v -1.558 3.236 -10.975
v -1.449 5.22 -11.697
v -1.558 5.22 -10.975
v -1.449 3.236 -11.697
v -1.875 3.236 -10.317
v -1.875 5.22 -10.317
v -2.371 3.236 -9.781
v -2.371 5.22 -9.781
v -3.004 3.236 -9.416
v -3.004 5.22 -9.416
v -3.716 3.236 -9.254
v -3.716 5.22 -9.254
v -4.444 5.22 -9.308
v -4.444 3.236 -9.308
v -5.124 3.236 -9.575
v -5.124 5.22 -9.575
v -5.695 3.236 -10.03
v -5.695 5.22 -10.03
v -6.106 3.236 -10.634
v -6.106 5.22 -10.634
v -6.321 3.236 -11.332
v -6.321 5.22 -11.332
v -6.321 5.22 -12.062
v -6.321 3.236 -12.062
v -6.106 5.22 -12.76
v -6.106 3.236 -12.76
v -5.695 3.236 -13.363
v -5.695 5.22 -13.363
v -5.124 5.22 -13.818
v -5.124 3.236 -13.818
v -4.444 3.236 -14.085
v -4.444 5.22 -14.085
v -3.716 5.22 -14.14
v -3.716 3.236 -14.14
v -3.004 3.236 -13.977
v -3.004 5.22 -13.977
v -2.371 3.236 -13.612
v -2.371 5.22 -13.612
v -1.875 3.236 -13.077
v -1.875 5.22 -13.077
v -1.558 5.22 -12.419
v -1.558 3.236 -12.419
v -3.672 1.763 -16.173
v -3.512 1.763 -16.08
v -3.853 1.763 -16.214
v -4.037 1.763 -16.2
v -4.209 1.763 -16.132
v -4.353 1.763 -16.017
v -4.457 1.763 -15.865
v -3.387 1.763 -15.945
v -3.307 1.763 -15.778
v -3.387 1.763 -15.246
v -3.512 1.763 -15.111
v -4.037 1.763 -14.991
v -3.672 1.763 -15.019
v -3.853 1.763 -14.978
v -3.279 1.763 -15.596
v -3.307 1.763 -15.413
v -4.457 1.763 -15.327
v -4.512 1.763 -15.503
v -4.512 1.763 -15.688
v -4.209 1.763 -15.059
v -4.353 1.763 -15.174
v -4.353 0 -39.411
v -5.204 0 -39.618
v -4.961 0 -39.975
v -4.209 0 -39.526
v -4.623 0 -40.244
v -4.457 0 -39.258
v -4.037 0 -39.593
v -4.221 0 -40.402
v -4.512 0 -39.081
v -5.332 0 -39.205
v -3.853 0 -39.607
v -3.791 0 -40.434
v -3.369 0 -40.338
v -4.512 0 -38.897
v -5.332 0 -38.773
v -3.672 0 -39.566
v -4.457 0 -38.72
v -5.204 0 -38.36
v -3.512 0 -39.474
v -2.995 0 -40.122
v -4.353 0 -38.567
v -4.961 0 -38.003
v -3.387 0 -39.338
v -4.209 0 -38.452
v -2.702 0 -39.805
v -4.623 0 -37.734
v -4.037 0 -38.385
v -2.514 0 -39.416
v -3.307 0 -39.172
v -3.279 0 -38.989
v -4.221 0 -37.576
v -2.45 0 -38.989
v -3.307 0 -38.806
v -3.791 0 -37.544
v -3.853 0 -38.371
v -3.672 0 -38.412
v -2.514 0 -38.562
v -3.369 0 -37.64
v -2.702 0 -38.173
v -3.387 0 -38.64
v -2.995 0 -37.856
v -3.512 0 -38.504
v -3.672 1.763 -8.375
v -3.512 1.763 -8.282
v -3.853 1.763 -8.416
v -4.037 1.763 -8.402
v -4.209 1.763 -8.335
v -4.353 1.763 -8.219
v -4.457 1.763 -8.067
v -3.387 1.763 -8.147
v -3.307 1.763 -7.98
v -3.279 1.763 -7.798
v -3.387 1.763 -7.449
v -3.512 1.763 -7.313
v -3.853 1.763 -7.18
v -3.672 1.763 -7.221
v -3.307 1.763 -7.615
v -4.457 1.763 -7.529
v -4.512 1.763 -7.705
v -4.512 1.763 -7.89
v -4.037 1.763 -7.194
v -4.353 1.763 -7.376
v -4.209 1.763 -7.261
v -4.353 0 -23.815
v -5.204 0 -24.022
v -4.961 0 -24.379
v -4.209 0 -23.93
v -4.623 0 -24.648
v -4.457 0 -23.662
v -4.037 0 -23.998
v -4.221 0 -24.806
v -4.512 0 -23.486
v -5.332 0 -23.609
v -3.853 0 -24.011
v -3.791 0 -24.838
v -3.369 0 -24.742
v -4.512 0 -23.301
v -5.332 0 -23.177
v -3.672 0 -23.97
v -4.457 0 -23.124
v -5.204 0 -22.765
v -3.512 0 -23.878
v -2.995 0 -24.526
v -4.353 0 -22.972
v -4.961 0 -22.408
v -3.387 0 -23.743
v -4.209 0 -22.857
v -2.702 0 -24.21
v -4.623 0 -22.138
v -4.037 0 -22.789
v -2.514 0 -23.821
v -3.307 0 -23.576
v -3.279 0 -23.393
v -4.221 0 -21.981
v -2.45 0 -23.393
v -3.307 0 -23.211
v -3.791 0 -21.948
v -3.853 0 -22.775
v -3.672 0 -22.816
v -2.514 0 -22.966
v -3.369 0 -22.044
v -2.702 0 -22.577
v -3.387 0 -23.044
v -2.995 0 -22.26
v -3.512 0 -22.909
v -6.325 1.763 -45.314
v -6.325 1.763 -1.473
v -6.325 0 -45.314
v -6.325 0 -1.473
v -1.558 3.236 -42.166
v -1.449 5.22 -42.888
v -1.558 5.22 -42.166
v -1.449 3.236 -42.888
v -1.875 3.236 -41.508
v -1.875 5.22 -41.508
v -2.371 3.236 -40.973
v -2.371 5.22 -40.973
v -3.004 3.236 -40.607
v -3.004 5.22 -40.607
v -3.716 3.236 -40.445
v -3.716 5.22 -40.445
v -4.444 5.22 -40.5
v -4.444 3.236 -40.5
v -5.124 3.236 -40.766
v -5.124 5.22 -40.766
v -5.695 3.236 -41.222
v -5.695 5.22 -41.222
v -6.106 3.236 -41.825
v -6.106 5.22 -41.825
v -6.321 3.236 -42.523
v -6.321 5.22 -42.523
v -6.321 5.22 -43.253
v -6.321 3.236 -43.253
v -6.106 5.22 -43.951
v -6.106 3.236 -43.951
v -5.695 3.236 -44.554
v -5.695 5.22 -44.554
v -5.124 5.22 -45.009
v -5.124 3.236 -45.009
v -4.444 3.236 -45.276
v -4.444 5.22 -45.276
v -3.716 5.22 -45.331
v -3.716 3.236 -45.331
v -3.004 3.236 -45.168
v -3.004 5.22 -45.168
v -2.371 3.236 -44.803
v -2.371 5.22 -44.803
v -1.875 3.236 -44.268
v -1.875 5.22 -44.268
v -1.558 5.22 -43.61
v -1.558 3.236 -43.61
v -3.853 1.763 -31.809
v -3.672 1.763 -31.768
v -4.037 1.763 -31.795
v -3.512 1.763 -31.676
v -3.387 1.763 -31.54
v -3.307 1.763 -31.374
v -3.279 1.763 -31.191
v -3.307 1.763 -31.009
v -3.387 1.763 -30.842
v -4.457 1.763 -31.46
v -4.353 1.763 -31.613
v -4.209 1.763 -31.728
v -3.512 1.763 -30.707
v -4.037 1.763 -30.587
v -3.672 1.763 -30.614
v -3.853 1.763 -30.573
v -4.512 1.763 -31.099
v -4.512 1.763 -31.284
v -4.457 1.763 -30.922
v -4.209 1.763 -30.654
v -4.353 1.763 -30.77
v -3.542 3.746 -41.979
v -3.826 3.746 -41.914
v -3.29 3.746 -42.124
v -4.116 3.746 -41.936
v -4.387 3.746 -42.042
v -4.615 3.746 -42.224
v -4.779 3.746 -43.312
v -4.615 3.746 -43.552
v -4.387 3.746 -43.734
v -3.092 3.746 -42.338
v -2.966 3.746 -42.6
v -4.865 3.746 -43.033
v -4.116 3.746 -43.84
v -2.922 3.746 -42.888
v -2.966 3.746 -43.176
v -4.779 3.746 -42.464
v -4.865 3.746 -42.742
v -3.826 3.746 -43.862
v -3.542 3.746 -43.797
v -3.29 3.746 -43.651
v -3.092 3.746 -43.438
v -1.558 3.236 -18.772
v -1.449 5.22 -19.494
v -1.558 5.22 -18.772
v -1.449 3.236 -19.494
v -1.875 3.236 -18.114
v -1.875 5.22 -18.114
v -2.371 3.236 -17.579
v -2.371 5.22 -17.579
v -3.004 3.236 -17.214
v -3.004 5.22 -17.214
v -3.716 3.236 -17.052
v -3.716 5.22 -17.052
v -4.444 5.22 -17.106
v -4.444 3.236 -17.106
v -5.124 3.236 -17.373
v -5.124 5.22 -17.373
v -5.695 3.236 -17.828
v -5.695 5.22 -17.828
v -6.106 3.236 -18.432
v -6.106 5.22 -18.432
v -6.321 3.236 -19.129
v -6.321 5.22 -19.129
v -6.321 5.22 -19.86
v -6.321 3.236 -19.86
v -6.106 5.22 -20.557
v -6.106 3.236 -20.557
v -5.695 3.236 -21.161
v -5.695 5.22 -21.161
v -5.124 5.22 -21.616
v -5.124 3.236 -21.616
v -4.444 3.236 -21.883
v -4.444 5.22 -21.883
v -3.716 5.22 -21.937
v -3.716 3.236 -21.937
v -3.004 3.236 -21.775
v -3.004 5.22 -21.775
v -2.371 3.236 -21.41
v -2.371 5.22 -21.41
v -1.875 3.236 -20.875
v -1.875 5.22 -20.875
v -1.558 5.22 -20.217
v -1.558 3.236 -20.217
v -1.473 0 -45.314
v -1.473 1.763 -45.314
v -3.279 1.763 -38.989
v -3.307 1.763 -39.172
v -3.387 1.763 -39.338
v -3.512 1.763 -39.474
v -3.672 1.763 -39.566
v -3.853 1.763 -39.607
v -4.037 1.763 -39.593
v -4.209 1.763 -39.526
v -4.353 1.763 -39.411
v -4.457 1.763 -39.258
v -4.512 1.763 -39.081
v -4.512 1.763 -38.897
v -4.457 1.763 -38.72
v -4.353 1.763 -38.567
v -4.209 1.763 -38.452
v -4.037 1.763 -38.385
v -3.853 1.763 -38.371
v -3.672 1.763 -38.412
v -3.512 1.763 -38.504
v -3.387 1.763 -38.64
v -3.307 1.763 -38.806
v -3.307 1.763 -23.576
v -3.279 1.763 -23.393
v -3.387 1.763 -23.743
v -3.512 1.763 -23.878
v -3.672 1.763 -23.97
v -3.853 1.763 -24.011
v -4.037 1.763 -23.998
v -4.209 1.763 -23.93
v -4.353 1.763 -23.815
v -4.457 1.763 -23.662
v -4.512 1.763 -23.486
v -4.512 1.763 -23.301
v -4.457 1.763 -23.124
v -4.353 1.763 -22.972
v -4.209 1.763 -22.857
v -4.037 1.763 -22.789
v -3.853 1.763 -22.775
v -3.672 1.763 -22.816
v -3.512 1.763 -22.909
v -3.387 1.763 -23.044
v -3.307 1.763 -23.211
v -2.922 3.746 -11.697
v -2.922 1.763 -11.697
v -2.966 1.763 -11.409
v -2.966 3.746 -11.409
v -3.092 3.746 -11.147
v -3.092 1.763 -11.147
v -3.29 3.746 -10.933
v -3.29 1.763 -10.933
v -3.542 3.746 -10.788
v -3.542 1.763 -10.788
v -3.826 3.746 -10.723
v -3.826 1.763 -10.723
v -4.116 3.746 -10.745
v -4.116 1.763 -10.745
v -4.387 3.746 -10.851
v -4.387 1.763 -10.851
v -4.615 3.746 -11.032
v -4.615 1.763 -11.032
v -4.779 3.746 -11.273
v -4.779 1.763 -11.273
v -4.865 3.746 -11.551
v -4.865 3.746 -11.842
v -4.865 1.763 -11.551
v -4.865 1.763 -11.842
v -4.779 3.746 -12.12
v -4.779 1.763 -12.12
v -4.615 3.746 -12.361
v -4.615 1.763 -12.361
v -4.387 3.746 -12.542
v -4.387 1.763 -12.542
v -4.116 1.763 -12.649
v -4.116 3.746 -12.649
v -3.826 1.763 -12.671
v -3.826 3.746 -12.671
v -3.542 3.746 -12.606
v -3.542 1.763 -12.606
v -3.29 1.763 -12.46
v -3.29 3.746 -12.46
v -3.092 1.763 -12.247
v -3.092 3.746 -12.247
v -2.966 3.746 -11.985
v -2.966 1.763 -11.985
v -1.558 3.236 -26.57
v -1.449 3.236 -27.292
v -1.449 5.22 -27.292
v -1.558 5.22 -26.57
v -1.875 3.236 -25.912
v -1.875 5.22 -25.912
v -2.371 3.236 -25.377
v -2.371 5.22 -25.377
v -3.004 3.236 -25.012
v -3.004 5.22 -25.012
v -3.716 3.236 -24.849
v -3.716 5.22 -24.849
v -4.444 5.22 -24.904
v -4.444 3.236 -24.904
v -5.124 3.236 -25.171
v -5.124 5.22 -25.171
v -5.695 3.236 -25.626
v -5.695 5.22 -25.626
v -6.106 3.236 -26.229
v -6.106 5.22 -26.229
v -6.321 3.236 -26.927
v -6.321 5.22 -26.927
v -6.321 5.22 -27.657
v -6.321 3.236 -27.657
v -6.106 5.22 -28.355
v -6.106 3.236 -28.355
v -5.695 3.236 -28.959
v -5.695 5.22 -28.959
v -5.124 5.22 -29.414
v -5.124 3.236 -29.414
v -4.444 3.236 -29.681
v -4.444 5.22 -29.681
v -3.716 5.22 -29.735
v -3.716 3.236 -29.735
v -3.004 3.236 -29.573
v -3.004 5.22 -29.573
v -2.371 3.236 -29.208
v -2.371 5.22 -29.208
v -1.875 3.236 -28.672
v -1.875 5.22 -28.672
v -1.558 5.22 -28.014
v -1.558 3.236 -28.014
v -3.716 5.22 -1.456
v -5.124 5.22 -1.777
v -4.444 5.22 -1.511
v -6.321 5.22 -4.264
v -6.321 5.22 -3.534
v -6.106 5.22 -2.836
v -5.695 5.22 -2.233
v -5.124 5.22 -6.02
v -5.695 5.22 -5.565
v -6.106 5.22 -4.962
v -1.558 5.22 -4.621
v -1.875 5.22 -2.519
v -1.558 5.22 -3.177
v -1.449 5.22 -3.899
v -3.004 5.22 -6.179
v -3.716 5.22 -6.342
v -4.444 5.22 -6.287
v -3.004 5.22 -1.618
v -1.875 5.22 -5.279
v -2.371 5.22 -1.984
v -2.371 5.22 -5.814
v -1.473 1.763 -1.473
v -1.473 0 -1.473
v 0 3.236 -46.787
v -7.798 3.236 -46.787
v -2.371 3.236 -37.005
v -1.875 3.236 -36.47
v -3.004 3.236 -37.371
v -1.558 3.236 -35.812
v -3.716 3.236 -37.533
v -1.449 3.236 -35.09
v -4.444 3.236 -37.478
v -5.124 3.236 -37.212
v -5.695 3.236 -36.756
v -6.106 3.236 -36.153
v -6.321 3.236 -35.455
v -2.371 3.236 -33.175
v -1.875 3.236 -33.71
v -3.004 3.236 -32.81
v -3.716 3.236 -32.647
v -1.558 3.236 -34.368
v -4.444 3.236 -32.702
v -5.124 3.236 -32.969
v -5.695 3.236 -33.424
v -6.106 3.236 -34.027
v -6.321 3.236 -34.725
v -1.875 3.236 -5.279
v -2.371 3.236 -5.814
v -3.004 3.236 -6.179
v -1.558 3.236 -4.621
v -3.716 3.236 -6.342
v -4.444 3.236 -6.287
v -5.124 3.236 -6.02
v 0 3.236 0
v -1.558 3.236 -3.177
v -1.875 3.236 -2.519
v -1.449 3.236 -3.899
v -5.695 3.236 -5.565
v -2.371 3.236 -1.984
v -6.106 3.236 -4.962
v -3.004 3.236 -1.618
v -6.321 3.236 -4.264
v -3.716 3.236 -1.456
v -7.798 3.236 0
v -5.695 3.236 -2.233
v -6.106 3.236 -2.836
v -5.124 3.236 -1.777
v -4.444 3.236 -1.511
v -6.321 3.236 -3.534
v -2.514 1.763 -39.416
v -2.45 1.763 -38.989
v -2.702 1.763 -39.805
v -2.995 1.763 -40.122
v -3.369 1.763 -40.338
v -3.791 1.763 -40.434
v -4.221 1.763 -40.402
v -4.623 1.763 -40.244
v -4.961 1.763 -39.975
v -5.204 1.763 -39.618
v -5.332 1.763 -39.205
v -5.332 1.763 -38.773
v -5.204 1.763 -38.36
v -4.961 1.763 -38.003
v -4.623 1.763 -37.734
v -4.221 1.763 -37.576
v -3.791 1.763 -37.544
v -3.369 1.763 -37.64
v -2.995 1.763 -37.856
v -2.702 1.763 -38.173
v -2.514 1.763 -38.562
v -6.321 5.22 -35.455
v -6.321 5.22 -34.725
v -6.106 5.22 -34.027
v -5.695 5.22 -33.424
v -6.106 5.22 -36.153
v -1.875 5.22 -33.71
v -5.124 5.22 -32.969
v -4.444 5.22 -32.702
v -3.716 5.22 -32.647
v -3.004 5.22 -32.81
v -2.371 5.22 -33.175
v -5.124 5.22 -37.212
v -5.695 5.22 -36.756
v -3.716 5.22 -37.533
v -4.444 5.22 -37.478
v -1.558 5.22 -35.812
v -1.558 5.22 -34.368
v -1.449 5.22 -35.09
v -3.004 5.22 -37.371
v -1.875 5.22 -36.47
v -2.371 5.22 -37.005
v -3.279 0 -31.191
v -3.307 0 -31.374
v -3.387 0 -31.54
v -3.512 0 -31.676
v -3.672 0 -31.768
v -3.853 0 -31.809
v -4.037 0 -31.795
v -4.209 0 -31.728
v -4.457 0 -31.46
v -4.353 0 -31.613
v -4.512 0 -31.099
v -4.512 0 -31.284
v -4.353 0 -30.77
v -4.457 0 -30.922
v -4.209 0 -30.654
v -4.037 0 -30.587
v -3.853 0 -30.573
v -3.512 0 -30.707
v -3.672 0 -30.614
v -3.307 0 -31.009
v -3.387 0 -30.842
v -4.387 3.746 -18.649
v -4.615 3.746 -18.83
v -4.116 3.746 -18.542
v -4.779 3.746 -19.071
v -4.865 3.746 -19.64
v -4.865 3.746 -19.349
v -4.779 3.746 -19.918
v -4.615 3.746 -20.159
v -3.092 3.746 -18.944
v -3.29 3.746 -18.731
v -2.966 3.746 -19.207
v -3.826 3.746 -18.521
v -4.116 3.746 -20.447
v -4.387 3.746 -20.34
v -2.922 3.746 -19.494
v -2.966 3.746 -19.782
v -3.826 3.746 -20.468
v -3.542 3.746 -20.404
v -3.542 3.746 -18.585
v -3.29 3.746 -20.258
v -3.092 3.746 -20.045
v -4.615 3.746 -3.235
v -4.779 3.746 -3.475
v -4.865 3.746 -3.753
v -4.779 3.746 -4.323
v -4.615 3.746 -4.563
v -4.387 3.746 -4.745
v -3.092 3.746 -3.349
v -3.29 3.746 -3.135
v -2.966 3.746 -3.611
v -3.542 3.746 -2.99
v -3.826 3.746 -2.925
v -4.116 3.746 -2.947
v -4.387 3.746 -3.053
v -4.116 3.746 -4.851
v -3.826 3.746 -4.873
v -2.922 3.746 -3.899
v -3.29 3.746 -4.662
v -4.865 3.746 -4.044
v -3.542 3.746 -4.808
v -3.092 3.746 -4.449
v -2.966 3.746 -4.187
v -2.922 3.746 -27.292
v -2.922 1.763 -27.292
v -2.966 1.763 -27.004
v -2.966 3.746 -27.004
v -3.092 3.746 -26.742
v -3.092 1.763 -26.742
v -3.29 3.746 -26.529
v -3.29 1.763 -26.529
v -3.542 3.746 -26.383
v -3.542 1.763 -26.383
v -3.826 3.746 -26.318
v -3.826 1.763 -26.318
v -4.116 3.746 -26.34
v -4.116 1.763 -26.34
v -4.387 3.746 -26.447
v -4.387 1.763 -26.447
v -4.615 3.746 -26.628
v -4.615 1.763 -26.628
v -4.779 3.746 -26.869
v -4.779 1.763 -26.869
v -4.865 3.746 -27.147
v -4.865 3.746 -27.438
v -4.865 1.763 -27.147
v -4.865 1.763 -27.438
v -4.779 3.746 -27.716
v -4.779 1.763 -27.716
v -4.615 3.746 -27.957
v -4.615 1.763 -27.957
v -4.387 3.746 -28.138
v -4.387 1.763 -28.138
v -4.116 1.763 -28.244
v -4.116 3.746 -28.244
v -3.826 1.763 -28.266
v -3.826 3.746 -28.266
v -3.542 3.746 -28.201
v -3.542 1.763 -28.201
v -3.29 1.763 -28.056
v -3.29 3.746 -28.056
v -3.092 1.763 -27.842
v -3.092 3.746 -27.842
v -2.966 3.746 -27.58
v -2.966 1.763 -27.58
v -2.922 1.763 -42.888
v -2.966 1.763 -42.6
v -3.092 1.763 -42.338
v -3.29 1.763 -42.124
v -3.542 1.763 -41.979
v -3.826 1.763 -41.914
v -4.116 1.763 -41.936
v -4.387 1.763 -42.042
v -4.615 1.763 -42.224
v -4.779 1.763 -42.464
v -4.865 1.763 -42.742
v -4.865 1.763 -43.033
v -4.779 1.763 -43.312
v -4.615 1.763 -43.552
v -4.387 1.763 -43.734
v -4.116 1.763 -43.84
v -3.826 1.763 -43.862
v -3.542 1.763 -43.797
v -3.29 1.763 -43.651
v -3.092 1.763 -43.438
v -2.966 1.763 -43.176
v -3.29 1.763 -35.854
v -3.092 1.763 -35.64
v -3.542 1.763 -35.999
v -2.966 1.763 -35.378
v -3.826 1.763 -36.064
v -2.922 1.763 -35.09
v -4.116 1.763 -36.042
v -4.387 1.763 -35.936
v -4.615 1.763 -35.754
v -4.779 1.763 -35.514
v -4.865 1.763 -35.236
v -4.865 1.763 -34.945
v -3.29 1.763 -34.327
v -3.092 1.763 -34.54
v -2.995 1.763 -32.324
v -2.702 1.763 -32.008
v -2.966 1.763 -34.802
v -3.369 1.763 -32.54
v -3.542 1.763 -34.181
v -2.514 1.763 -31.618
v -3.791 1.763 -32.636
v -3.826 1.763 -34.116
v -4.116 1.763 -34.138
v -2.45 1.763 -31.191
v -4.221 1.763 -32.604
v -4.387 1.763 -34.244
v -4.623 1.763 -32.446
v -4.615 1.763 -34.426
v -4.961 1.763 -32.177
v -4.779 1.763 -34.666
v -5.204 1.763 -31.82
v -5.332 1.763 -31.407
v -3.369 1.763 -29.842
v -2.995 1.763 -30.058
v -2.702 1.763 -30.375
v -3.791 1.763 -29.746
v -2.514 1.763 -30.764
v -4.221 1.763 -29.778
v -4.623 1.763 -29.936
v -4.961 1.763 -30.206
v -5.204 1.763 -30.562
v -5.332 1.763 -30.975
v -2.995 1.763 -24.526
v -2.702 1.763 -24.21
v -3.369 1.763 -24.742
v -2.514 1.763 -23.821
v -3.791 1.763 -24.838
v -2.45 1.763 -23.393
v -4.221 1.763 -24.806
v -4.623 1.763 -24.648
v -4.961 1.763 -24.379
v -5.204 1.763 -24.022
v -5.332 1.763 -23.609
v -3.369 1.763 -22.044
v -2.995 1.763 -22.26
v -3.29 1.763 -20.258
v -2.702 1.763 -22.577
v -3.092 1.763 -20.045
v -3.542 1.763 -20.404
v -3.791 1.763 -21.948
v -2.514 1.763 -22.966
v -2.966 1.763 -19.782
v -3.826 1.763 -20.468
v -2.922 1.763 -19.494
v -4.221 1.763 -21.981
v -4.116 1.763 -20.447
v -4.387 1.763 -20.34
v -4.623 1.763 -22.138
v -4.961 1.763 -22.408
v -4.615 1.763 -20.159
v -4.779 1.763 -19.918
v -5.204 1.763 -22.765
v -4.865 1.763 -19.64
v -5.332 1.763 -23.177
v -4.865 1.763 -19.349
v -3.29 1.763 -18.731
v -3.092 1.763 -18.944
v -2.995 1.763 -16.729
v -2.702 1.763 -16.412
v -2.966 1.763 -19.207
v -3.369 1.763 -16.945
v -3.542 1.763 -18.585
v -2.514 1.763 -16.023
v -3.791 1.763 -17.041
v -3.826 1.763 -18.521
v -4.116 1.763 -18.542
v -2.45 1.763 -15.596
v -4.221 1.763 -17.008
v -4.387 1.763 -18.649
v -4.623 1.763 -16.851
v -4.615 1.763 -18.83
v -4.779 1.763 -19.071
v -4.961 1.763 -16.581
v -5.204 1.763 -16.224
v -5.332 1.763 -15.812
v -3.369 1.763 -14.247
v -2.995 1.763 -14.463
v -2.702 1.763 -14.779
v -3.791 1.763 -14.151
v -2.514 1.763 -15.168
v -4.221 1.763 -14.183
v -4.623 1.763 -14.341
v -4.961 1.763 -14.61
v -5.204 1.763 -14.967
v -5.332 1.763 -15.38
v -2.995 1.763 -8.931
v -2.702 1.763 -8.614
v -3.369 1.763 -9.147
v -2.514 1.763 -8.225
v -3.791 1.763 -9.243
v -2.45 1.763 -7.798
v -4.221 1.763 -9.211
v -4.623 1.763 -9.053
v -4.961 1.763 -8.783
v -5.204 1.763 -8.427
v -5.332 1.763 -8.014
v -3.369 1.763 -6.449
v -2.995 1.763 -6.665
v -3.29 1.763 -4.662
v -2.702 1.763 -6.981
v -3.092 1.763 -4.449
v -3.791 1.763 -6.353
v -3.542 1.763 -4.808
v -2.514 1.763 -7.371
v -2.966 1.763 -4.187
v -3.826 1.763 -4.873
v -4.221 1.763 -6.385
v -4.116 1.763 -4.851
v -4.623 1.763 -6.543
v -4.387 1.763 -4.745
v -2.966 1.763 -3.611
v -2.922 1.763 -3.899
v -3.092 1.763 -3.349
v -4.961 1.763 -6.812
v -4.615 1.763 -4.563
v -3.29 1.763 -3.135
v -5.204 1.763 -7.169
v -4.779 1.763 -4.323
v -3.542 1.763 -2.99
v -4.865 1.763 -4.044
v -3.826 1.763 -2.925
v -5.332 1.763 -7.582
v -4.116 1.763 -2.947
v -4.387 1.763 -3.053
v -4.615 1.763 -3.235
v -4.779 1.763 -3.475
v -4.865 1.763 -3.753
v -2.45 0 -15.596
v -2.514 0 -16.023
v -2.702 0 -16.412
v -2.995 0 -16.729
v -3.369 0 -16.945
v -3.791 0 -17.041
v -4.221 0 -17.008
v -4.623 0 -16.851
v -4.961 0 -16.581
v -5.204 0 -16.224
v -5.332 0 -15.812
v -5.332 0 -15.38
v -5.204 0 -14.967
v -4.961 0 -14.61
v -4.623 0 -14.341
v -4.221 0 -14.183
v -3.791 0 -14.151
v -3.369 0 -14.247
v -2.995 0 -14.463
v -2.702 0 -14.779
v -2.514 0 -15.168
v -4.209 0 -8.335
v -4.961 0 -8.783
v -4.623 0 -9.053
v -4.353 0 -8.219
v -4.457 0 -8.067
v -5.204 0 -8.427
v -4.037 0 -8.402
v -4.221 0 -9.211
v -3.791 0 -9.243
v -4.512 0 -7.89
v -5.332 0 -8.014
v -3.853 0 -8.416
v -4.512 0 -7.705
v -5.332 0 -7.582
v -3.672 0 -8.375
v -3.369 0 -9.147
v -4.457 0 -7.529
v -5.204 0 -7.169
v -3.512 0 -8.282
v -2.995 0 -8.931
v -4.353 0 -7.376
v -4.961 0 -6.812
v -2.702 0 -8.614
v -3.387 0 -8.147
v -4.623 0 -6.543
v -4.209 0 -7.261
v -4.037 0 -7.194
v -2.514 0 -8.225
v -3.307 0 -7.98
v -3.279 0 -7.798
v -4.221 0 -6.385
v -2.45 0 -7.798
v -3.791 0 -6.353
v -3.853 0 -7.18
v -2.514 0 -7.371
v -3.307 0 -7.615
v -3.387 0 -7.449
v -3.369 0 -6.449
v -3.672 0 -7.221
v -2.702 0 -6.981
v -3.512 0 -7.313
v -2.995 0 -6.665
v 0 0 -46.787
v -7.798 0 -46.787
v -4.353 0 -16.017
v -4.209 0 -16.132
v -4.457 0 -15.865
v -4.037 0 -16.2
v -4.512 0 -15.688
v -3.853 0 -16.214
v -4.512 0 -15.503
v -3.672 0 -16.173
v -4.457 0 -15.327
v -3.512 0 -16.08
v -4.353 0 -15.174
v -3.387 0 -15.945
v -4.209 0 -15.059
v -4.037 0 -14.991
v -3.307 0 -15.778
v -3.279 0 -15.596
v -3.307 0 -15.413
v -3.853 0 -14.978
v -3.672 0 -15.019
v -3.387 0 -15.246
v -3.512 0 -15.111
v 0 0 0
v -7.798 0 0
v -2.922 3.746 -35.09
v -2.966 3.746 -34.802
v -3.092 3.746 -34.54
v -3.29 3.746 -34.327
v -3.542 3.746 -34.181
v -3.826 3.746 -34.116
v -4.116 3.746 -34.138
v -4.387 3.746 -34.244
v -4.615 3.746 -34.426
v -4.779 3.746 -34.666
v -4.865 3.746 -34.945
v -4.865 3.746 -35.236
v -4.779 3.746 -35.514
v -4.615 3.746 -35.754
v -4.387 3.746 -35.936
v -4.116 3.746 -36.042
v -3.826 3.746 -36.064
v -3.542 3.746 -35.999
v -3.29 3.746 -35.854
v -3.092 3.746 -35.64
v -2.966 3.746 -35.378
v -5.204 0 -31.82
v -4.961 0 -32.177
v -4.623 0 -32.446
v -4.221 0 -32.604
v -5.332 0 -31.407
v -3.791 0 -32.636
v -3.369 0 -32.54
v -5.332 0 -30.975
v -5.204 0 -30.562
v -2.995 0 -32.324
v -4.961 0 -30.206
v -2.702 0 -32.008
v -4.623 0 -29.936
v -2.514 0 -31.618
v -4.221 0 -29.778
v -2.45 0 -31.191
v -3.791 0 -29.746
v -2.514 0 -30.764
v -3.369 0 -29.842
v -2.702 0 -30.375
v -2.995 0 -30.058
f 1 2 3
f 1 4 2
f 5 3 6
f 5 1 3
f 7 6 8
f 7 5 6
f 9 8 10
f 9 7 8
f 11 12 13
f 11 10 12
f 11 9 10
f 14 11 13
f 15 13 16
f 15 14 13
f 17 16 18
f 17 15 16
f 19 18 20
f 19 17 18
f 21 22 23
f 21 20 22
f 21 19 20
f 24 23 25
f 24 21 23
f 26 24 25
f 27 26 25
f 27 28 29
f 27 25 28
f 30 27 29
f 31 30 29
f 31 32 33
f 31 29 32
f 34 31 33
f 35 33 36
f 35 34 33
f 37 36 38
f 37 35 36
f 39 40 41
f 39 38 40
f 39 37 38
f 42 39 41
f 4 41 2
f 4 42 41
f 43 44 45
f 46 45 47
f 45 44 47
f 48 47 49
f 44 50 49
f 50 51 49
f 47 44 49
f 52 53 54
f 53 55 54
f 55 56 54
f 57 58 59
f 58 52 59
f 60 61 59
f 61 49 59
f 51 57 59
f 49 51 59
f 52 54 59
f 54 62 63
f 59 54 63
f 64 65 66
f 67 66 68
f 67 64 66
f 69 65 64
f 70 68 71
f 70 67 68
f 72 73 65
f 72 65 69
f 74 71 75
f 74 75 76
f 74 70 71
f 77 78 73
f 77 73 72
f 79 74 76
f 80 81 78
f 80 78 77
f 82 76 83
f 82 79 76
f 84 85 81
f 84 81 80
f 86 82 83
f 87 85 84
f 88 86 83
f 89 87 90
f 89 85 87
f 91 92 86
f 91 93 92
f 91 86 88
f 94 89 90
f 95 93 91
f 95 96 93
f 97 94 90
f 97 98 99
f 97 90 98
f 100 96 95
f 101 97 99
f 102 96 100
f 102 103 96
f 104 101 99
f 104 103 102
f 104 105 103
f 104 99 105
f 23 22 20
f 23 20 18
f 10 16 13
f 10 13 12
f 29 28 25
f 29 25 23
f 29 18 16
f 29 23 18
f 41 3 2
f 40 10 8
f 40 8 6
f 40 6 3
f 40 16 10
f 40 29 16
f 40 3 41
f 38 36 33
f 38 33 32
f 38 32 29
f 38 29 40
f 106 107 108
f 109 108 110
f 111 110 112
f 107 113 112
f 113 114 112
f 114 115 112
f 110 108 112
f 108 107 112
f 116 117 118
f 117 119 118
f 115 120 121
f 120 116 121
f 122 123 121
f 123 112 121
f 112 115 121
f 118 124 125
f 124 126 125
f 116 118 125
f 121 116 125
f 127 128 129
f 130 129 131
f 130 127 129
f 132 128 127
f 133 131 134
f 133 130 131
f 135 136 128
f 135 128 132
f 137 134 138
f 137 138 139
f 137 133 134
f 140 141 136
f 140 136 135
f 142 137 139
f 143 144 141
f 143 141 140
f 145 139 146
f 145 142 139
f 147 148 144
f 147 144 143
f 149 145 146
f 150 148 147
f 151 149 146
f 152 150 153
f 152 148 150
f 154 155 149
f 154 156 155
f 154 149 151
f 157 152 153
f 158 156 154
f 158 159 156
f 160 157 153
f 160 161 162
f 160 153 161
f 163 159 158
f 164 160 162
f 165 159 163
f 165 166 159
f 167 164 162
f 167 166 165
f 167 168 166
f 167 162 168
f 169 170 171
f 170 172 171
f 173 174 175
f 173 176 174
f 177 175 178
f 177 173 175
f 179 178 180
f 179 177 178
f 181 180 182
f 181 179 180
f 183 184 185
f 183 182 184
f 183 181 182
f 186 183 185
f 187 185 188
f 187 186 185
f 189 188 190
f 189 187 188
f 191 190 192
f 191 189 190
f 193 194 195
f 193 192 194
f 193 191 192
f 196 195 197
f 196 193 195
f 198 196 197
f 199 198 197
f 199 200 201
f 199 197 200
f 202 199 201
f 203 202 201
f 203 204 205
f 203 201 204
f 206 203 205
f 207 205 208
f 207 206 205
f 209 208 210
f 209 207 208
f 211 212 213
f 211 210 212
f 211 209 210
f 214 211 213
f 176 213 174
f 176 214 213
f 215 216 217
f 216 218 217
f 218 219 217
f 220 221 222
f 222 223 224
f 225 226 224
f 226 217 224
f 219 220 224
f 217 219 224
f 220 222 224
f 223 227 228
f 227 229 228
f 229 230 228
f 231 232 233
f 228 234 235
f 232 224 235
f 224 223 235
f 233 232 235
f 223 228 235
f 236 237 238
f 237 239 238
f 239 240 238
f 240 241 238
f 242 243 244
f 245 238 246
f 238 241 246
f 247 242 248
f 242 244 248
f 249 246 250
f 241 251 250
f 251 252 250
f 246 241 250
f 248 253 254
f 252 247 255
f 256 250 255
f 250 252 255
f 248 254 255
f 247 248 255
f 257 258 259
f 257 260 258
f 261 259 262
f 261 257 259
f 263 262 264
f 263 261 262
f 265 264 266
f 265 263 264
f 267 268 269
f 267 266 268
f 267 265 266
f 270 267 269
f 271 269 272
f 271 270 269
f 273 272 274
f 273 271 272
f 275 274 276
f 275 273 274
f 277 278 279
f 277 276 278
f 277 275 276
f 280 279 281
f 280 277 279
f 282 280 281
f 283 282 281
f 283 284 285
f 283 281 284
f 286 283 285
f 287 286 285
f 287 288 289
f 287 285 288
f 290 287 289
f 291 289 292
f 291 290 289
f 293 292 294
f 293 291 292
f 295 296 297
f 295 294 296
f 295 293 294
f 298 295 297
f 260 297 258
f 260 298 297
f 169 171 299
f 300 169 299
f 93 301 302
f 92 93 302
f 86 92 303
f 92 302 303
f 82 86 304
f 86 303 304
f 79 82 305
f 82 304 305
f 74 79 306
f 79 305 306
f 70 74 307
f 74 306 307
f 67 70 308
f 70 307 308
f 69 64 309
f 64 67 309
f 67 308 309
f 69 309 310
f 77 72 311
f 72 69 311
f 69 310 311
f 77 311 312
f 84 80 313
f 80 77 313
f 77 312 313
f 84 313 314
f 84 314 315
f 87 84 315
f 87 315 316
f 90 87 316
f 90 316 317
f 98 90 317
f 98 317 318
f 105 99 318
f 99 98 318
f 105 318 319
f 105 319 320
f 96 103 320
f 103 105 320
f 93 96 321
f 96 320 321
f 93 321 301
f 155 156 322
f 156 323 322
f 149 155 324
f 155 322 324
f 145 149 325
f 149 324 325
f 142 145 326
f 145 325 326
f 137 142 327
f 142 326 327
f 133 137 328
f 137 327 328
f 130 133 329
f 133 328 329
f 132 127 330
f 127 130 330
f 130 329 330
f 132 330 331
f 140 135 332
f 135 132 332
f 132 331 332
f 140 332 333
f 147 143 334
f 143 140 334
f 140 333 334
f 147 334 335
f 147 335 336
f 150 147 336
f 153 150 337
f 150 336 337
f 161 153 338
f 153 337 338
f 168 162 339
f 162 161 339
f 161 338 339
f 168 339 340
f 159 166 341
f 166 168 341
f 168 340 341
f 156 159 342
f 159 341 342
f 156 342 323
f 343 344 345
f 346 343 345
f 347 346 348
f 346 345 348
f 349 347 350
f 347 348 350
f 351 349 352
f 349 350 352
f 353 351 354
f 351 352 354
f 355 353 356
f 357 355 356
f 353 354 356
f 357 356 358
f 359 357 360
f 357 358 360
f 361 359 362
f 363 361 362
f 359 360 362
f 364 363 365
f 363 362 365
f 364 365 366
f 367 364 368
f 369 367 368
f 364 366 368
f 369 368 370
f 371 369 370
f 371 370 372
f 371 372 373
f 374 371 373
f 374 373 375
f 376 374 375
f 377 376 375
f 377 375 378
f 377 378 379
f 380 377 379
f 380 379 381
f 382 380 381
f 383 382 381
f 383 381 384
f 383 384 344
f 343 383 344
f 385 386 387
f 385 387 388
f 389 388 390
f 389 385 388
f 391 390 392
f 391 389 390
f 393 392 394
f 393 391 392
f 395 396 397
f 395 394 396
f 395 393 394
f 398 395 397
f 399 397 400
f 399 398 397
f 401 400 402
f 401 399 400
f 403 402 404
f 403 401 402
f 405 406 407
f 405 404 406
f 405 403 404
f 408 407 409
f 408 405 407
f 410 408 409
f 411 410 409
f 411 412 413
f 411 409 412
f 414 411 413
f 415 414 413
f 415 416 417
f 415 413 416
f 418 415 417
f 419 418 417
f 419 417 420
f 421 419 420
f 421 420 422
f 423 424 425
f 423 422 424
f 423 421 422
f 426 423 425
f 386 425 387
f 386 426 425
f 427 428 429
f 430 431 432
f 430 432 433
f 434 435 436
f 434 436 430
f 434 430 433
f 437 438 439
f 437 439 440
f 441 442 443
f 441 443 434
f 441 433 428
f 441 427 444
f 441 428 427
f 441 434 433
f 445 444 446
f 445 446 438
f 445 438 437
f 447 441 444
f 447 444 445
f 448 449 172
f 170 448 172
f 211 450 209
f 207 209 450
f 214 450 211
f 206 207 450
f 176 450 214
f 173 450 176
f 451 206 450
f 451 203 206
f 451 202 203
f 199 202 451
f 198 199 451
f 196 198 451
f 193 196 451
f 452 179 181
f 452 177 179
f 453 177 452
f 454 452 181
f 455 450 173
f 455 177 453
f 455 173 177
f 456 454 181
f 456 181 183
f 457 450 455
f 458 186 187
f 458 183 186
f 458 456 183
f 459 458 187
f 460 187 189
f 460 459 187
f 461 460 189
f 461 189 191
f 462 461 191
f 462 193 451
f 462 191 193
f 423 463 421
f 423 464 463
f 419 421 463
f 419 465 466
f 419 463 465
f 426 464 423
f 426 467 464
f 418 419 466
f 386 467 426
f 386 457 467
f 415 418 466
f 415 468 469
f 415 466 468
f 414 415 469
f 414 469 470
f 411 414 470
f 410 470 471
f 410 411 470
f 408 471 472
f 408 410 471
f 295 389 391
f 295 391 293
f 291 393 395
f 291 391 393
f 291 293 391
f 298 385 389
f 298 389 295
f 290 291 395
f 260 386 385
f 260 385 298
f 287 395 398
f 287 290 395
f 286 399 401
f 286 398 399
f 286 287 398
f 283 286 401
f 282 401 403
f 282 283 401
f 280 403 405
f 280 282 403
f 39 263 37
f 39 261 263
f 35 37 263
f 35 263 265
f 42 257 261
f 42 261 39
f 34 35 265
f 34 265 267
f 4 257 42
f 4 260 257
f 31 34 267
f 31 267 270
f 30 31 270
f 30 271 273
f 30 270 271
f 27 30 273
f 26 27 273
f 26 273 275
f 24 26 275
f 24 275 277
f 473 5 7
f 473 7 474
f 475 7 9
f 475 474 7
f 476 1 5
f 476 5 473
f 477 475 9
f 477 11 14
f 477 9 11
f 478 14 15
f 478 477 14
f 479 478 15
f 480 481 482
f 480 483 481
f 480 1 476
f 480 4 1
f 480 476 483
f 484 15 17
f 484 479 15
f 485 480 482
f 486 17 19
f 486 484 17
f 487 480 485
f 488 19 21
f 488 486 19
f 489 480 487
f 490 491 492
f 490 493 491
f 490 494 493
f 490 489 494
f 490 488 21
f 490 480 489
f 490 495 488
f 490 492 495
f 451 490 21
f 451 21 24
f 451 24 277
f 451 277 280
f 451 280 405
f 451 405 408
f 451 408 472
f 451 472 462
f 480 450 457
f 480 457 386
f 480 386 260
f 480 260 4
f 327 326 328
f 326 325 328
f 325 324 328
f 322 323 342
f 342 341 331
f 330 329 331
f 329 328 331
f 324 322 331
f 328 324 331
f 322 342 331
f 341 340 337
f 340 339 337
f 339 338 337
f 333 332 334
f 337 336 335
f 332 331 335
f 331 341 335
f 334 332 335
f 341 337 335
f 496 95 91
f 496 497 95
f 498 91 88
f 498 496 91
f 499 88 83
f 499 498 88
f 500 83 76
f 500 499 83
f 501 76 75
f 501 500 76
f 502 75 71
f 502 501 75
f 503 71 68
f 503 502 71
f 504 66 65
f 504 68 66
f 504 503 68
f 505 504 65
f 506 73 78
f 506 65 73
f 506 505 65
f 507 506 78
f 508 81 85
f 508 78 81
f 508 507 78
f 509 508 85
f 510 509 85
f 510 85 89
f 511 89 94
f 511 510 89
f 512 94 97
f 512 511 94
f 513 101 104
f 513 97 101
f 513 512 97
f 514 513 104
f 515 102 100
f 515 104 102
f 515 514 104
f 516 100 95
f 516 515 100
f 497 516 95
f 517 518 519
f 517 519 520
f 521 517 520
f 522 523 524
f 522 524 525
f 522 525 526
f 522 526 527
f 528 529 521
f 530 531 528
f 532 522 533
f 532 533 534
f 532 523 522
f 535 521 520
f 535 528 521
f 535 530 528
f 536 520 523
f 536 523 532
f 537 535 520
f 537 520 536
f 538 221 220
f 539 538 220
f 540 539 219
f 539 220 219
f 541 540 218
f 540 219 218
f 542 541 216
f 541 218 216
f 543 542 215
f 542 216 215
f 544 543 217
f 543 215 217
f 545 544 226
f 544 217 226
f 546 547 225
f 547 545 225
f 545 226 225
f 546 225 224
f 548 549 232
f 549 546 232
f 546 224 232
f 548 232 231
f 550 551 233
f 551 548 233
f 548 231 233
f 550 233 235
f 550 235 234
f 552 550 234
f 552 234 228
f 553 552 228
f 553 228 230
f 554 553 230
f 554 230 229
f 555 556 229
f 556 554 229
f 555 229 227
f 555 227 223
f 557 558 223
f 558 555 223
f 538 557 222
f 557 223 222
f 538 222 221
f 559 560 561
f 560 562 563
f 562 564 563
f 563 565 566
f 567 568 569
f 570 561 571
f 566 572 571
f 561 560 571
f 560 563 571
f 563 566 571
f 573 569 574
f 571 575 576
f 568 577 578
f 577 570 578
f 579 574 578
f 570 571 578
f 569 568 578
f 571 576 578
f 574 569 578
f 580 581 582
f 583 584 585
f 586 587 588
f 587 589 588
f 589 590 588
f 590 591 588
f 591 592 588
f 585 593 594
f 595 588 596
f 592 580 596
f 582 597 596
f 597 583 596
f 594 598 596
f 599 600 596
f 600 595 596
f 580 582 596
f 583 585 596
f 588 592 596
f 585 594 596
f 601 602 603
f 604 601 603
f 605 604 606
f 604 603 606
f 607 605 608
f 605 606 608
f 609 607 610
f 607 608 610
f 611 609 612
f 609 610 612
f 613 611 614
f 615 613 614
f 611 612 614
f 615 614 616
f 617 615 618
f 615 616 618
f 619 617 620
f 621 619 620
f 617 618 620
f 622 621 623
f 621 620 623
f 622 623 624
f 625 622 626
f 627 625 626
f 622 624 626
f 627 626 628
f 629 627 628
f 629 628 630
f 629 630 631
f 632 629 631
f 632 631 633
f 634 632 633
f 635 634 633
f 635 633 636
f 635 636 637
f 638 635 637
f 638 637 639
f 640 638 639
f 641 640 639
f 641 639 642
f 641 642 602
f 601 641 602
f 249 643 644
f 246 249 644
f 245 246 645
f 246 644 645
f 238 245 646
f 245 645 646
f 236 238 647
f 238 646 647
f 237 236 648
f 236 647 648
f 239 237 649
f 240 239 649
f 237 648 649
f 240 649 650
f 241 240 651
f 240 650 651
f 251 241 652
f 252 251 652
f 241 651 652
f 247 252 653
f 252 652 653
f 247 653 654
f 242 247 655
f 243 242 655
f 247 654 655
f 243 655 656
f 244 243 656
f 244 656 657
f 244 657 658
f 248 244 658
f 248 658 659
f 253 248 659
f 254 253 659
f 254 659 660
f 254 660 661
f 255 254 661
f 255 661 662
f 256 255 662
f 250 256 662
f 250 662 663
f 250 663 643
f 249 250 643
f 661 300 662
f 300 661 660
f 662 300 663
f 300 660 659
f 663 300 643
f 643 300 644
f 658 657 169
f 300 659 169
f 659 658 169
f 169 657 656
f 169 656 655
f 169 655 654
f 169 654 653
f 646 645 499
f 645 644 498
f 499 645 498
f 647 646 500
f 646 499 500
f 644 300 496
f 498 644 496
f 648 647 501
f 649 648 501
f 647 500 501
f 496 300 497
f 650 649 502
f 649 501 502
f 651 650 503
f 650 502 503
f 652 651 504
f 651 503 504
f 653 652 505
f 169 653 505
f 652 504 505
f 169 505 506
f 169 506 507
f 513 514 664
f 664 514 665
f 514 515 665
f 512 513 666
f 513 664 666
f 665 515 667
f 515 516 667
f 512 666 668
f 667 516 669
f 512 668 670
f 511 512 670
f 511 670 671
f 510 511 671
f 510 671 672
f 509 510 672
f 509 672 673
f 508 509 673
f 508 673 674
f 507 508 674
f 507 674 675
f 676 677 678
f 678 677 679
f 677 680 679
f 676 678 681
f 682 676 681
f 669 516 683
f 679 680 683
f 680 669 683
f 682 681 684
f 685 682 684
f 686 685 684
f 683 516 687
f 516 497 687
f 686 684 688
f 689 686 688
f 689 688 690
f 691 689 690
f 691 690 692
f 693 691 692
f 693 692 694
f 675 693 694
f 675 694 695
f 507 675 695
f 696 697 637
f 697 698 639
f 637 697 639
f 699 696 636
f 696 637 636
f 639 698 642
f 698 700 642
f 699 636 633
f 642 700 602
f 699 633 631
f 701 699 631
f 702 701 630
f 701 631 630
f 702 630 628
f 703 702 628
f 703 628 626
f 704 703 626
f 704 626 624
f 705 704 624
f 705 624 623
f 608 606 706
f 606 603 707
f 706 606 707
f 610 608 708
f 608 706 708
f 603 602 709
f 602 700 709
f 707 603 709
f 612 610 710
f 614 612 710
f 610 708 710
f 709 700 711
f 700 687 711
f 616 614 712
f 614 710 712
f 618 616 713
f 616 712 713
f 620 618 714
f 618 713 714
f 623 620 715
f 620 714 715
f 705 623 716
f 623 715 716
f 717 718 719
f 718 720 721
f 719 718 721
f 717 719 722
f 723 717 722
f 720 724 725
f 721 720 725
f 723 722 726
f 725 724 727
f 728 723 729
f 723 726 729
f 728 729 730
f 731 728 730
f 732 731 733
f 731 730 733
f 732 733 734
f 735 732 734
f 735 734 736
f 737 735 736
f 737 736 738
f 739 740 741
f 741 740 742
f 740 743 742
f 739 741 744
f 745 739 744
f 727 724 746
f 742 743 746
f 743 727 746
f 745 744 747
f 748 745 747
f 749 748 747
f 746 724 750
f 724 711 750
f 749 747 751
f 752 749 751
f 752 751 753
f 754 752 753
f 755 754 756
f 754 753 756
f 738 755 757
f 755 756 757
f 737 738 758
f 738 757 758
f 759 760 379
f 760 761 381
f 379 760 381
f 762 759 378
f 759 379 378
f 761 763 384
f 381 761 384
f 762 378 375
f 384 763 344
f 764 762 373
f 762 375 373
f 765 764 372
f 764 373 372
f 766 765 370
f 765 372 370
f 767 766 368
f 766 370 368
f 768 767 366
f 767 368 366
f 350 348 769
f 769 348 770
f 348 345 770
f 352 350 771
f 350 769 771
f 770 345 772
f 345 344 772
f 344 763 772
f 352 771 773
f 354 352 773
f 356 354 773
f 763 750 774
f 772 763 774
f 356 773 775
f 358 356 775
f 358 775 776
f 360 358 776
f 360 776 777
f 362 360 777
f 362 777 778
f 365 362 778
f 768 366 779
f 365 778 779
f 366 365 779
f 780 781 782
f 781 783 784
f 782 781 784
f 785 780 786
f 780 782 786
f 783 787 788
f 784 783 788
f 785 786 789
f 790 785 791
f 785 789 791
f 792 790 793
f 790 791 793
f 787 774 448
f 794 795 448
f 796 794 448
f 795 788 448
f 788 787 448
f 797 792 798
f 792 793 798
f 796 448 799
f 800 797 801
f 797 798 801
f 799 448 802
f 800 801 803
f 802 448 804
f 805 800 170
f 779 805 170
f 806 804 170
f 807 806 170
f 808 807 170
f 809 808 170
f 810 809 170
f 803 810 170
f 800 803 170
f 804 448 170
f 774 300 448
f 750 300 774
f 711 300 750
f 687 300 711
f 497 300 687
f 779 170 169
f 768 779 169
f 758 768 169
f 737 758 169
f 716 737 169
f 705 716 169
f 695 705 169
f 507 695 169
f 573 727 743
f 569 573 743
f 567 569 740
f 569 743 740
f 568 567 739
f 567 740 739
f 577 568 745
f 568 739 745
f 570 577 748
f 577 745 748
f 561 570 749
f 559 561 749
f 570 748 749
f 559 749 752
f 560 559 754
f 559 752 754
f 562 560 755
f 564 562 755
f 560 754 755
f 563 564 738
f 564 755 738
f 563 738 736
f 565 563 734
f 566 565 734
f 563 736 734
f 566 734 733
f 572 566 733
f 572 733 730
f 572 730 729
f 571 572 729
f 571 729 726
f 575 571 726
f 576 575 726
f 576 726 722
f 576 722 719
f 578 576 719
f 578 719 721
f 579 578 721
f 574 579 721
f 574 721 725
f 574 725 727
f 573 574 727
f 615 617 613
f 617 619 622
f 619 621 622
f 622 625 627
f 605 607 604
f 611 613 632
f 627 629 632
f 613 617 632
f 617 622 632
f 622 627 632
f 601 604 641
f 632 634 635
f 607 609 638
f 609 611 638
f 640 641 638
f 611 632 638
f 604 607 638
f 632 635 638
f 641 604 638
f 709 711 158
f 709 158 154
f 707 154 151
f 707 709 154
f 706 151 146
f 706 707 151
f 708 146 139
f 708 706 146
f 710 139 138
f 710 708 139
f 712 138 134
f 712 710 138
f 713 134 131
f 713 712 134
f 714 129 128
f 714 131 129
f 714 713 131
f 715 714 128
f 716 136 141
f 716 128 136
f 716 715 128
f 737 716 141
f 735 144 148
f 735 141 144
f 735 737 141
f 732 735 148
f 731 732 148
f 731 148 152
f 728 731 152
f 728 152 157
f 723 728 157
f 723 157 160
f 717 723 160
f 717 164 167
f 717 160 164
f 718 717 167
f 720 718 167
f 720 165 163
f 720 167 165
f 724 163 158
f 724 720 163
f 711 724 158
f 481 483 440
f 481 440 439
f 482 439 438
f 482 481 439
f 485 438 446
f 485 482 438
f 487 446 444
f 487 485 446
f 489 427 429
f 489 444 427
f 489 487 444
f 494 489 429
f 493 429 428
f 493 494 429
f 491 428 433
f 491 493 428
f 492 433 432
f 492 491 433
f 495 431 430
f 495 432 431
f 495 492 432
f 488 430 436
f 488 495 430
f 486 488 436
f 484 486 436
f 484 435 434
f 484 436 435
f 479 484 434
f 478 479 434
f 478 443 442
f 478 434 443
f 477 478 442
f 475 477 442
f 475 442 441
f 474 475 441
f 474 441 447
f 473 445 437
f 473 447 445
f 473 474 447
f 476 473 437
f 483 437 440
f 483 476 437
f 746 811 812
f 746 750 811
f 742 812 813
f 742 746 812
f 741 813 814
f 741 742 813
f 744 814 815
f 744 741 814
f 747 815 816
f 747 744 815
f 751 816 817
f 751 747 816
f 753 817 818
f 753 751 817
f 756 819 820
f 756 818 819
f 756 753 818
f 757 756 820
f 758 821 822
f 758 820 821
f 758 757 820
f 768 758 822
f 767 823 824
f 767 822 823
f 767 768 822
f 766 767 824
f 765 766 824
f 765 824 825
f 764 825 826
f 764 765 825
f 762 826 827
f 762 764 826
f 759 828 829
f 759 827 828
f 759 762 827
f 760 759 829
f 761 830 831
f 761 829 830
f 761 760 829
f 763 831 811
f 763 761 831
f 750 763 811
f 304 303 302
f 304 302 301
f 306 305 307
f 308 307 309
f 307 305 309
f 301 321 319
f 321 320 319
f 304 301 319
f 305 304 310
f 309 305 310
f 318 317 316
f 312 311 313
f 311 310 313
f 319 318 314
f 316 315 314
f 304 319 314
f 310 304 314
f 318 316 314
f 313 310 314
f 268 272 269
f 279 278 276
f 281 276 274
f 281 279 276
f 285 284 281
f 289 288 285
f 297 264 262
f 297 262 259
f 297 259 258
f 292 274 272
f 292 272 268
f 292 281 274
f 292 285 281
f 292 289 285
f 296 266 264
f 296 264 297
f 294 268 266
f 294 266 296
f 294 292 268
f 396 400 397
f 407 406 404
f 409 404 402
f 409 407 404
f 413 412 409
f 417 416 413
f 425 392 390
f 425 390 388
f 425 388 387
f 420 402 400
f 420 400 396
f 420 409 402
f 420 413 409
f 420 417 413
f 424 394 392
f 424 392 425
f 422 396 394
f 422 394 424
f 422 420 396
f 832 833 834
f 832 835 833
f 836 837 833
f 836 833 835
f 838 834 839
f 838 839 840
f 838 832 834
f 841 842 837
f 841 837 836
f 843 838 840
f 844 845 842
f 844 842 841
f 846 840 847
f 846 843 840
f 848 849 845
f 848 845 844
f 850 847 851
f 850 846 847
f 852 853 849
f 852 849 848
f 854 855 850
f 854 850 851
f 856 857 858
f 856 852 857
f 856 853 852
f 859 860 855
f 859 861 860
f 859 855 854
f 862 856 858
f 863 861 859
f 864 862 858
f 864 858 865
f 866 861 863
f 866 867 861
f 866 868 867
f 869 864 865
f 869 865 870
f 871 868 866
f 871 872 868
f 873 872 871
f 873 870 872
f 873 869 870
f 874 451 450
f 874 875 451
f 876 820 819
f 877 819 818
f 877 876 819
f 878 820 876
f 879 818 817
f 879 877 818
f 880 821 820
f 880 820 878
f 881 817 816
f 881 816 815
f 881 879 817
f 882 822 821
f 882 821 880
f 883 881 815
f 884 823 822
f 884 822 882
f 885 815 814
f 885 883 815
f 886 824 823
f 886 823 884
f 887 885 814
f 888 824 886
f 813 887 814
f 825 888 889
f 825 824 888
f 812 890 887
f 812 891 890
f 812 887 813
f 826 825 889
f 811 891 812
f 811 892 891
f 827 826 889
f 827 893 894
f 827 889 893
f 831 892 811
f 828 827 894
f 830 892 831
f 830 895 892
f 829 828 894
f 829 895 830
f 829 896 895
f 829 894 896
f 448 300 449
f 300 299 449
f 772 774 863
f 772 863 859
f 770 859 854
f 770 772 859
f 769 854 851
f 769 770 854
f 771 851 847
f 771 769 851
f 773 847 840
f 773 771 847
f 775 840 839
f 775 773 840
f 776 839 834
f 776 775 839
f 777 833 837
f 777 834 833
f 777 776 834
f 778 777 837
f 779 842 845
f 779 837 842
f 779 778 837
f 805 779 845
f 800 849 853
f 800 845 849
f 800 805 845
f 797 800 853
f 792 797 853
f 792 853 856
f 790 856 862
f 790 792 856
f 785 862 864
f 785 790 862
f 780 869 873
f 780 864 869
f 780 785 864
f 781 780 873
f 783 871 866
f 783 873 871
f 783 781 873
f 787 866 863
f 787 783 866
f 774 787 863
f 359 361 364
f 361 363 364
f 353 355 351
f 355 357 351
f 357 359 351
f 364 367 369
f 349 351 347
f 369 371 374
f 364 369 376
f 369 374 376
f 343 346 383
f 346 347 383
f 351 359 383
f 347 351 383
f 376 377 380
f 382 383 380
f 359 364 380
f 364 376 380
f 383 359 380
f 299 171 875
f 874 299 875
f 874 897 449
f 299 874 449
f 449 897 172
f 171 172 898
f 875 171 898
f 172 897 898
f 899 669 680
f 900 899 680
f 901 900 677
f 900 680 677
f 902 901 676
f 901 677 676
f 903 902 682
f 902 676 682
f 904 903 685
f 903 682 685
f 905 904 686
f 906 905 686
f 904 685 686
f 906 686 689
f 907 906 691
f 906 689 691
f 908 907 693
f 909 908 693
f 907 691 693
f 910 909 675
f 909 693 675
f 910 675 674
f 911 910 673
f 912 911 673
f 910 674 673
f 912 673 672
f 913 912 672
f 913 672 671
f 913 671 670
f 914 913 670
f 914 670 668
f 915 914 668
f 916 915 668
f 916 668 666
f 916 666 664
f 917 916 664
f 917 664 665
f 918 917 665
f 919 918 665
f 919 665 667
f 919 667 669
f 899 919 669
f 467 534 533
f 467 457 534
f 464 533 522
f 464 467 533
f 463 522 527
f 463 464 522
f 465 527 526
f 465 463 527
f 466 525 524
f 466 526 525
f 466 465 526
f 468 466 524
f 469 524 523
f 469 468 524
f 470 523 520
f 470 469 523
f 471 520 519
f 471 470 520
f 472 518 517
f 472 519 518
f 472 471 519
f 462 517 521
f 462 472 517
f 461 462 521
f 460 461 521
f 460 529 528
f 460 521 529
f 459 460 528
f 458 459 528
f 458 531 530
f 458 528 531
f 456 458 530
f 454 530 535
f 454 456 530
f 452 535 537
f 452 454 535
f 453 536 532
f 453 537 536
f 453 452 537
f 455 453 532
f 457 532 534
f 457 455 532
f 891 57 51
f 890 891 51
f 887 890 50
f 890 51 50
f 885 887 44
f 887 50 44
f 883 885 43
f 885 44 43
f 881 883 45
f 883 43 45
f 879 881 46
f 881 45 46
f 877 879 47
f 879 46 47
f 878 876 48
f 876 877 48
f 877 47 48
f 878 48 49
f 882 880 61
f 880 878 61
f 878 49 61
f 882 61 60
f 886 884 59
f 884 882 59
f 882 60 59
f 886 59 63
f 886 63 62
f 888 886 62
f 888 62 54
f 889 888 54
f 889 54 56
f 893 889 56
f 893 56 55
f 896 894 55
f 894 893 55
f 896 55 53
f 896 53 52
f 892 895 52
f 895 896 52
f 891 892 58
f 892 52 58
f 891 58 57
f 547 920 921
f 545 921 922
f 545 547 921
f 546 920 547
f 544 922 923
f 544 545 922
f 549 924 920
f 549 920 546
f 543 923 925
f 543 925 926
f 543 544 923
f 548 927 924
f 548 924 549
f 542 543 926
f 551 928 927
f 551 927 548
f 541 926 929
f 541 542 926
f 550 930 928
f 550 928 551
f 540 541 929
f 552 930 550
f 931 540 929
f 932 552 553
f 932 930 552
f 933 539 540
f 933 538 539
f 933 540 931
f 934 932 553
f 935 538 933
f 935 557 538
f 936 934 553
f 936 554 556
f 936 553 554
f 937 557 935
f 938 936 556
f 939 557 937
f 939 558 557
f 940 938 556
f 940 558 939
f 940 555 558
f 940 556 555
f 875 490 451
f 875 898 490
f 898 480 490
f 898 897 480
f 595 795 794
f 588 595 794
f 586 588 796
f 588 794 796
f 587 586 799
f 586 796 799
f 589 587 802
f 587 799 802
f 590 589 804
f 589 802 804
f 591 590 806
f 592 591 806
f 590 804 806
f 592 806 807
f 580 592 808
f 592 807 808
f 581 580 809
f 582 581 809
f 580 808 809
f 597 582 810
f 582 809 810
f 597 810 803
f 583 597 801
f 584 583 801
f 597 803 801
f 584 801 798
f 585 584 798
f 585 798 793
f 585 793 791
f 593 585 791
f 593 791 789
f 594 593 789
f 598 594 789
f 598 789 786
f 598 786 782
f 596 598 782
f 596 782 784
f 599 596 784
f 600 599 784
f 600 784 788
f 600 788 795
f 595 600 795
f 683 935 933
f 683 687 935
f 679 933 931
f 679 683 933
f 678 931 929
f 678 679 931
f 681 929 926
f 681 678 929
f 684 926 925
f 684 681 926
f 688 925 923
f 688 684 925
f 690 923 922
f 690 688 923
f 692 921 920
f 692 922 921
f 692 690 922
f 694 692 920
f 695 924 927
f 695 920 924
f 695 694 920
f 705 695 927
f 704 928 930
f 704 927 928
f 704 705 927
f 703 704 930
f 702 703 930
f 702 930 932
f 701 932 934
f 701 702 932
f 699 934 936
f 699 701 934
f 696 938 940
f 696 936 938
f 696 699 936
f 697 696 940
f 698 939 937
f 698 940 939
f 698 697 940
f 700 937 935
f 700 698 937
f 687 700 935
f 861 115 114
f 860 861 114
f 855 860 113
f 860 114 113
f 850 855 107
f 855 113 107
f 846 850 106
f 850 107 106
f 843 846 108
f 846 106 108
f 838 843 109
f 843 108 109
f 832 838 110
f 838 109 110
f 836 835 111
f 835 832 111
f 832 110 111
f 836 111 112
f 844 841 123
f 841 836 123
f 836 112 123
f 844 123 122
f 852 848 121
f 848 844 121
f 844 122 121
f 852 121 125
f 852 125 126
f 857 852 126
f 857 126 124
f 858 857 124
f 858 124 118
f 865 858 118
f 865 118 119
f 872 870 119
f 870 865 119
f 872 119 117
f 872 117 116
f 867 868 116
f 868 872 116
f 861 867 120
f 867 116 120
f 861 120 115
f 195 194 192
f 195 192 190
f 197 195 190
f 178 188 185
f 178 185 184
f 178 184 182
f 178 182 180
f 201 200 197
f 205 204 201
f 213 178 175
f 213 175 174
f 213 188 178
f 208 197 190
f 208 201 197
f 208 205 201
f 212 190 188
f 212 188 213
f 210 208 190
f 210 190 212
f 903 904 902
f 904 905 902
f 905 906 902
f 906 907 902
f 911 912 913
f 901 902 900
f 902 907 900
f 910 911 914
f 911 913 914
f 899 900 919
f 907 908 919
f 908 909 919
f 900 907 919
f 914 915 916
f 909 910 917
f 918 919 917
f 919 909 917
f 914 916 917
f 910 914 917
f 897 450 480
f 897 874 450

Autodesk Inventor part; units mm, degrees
ref_plane "YZ Plane" through (0, 0, 0) normal (1, 0, 0) x (0, 1, 0)
ref_plane "XZ Plane" through (0, 0, 0) normal (0, 1, 0) x (-1, 0, 0)
ref_plane "XY Plane" through (0, 0, 0) normal (0, 0, 1) x (1, 0, 0)
sketch "Sketch1" plane through (0, 0, 0) normal (0, 1, 0) x (-1, 0, 0)
  line L0 (0, 0) -> (7.7978, 0)
  line L1 (7.7978, 0) -> (7.7978, -46.7868)
  line L2 (7.7978, -46.7868) -> (0, -46.7868)
  line L3 (0, -46.7868) -> (0, 0)
  dimension "d0" = 7.7978
  dimension "d1" = 46.7868
extrude "Extrusion1" add sketch "Sketch1" along normal blind 3.236
sketch "Sketch2" plane through (0, 3.236, 0) normal (0, 1, 0) x (1, 0, 0)
  line L0 (0, 0) -> (-3.8989, 0) construction
  line L1 (-3.8989, 0) -> (-3.8989, 3.8989) construction
  line L2 (-3.8989, 3.8989) -> (0, 3.8989) construction
  line L3 (0, 3.8989) -> (0, 0) construction
  circle A0 centre (-3.8989, 3.8989) radius 2.4498
  dimension "d4" = 3.8989
  dimension "d5" = 3.8989
  dimension "d6" = 4.8997
extrude "Extrusion2" add sketch "Sketch2" along normal blind 1.9837
pattern_linear "Rectangular Pattern1" count 6 spacing 7.7978 along (0, 0, -1) of "Extrusion2"
shell "Shell1" thickness 1.4732 removed faces 1 at (-2.5993, 0, -15.5956)
sketch "Sketch3" plane through (-6.3246, 1.7628, -1.4732) normal (0, -1, 0) x (1, 0, 0)
  circle A0 centre (2.4257, -2.4257) radius 2.4498 construction
  circle A1 centre (2.4257, -10.2235) radius 2.4498 construction
  line L0 (2.4257, -2.4257) -> (2.4257, -10.2235) construction
  circle A2 centre (2.4257, -6.3246) radius 0.6198
  circle A3 centre (2.4257, -6.3246) radius 1.4491
  point P0 (6.3246, 1.4732)
  dimension "d13" = 1.2395
extrude "Extrusion3" add sketch "Sketch3" along normal up to surface (1.7628 mm away)
pattern_linear "Rectangular Pattern2" count 5 spacing 7.7978 along (0, 0, -1) of "Extrusion3"
properties part number "1x6 short black pegged" material "ABS Plastic"
